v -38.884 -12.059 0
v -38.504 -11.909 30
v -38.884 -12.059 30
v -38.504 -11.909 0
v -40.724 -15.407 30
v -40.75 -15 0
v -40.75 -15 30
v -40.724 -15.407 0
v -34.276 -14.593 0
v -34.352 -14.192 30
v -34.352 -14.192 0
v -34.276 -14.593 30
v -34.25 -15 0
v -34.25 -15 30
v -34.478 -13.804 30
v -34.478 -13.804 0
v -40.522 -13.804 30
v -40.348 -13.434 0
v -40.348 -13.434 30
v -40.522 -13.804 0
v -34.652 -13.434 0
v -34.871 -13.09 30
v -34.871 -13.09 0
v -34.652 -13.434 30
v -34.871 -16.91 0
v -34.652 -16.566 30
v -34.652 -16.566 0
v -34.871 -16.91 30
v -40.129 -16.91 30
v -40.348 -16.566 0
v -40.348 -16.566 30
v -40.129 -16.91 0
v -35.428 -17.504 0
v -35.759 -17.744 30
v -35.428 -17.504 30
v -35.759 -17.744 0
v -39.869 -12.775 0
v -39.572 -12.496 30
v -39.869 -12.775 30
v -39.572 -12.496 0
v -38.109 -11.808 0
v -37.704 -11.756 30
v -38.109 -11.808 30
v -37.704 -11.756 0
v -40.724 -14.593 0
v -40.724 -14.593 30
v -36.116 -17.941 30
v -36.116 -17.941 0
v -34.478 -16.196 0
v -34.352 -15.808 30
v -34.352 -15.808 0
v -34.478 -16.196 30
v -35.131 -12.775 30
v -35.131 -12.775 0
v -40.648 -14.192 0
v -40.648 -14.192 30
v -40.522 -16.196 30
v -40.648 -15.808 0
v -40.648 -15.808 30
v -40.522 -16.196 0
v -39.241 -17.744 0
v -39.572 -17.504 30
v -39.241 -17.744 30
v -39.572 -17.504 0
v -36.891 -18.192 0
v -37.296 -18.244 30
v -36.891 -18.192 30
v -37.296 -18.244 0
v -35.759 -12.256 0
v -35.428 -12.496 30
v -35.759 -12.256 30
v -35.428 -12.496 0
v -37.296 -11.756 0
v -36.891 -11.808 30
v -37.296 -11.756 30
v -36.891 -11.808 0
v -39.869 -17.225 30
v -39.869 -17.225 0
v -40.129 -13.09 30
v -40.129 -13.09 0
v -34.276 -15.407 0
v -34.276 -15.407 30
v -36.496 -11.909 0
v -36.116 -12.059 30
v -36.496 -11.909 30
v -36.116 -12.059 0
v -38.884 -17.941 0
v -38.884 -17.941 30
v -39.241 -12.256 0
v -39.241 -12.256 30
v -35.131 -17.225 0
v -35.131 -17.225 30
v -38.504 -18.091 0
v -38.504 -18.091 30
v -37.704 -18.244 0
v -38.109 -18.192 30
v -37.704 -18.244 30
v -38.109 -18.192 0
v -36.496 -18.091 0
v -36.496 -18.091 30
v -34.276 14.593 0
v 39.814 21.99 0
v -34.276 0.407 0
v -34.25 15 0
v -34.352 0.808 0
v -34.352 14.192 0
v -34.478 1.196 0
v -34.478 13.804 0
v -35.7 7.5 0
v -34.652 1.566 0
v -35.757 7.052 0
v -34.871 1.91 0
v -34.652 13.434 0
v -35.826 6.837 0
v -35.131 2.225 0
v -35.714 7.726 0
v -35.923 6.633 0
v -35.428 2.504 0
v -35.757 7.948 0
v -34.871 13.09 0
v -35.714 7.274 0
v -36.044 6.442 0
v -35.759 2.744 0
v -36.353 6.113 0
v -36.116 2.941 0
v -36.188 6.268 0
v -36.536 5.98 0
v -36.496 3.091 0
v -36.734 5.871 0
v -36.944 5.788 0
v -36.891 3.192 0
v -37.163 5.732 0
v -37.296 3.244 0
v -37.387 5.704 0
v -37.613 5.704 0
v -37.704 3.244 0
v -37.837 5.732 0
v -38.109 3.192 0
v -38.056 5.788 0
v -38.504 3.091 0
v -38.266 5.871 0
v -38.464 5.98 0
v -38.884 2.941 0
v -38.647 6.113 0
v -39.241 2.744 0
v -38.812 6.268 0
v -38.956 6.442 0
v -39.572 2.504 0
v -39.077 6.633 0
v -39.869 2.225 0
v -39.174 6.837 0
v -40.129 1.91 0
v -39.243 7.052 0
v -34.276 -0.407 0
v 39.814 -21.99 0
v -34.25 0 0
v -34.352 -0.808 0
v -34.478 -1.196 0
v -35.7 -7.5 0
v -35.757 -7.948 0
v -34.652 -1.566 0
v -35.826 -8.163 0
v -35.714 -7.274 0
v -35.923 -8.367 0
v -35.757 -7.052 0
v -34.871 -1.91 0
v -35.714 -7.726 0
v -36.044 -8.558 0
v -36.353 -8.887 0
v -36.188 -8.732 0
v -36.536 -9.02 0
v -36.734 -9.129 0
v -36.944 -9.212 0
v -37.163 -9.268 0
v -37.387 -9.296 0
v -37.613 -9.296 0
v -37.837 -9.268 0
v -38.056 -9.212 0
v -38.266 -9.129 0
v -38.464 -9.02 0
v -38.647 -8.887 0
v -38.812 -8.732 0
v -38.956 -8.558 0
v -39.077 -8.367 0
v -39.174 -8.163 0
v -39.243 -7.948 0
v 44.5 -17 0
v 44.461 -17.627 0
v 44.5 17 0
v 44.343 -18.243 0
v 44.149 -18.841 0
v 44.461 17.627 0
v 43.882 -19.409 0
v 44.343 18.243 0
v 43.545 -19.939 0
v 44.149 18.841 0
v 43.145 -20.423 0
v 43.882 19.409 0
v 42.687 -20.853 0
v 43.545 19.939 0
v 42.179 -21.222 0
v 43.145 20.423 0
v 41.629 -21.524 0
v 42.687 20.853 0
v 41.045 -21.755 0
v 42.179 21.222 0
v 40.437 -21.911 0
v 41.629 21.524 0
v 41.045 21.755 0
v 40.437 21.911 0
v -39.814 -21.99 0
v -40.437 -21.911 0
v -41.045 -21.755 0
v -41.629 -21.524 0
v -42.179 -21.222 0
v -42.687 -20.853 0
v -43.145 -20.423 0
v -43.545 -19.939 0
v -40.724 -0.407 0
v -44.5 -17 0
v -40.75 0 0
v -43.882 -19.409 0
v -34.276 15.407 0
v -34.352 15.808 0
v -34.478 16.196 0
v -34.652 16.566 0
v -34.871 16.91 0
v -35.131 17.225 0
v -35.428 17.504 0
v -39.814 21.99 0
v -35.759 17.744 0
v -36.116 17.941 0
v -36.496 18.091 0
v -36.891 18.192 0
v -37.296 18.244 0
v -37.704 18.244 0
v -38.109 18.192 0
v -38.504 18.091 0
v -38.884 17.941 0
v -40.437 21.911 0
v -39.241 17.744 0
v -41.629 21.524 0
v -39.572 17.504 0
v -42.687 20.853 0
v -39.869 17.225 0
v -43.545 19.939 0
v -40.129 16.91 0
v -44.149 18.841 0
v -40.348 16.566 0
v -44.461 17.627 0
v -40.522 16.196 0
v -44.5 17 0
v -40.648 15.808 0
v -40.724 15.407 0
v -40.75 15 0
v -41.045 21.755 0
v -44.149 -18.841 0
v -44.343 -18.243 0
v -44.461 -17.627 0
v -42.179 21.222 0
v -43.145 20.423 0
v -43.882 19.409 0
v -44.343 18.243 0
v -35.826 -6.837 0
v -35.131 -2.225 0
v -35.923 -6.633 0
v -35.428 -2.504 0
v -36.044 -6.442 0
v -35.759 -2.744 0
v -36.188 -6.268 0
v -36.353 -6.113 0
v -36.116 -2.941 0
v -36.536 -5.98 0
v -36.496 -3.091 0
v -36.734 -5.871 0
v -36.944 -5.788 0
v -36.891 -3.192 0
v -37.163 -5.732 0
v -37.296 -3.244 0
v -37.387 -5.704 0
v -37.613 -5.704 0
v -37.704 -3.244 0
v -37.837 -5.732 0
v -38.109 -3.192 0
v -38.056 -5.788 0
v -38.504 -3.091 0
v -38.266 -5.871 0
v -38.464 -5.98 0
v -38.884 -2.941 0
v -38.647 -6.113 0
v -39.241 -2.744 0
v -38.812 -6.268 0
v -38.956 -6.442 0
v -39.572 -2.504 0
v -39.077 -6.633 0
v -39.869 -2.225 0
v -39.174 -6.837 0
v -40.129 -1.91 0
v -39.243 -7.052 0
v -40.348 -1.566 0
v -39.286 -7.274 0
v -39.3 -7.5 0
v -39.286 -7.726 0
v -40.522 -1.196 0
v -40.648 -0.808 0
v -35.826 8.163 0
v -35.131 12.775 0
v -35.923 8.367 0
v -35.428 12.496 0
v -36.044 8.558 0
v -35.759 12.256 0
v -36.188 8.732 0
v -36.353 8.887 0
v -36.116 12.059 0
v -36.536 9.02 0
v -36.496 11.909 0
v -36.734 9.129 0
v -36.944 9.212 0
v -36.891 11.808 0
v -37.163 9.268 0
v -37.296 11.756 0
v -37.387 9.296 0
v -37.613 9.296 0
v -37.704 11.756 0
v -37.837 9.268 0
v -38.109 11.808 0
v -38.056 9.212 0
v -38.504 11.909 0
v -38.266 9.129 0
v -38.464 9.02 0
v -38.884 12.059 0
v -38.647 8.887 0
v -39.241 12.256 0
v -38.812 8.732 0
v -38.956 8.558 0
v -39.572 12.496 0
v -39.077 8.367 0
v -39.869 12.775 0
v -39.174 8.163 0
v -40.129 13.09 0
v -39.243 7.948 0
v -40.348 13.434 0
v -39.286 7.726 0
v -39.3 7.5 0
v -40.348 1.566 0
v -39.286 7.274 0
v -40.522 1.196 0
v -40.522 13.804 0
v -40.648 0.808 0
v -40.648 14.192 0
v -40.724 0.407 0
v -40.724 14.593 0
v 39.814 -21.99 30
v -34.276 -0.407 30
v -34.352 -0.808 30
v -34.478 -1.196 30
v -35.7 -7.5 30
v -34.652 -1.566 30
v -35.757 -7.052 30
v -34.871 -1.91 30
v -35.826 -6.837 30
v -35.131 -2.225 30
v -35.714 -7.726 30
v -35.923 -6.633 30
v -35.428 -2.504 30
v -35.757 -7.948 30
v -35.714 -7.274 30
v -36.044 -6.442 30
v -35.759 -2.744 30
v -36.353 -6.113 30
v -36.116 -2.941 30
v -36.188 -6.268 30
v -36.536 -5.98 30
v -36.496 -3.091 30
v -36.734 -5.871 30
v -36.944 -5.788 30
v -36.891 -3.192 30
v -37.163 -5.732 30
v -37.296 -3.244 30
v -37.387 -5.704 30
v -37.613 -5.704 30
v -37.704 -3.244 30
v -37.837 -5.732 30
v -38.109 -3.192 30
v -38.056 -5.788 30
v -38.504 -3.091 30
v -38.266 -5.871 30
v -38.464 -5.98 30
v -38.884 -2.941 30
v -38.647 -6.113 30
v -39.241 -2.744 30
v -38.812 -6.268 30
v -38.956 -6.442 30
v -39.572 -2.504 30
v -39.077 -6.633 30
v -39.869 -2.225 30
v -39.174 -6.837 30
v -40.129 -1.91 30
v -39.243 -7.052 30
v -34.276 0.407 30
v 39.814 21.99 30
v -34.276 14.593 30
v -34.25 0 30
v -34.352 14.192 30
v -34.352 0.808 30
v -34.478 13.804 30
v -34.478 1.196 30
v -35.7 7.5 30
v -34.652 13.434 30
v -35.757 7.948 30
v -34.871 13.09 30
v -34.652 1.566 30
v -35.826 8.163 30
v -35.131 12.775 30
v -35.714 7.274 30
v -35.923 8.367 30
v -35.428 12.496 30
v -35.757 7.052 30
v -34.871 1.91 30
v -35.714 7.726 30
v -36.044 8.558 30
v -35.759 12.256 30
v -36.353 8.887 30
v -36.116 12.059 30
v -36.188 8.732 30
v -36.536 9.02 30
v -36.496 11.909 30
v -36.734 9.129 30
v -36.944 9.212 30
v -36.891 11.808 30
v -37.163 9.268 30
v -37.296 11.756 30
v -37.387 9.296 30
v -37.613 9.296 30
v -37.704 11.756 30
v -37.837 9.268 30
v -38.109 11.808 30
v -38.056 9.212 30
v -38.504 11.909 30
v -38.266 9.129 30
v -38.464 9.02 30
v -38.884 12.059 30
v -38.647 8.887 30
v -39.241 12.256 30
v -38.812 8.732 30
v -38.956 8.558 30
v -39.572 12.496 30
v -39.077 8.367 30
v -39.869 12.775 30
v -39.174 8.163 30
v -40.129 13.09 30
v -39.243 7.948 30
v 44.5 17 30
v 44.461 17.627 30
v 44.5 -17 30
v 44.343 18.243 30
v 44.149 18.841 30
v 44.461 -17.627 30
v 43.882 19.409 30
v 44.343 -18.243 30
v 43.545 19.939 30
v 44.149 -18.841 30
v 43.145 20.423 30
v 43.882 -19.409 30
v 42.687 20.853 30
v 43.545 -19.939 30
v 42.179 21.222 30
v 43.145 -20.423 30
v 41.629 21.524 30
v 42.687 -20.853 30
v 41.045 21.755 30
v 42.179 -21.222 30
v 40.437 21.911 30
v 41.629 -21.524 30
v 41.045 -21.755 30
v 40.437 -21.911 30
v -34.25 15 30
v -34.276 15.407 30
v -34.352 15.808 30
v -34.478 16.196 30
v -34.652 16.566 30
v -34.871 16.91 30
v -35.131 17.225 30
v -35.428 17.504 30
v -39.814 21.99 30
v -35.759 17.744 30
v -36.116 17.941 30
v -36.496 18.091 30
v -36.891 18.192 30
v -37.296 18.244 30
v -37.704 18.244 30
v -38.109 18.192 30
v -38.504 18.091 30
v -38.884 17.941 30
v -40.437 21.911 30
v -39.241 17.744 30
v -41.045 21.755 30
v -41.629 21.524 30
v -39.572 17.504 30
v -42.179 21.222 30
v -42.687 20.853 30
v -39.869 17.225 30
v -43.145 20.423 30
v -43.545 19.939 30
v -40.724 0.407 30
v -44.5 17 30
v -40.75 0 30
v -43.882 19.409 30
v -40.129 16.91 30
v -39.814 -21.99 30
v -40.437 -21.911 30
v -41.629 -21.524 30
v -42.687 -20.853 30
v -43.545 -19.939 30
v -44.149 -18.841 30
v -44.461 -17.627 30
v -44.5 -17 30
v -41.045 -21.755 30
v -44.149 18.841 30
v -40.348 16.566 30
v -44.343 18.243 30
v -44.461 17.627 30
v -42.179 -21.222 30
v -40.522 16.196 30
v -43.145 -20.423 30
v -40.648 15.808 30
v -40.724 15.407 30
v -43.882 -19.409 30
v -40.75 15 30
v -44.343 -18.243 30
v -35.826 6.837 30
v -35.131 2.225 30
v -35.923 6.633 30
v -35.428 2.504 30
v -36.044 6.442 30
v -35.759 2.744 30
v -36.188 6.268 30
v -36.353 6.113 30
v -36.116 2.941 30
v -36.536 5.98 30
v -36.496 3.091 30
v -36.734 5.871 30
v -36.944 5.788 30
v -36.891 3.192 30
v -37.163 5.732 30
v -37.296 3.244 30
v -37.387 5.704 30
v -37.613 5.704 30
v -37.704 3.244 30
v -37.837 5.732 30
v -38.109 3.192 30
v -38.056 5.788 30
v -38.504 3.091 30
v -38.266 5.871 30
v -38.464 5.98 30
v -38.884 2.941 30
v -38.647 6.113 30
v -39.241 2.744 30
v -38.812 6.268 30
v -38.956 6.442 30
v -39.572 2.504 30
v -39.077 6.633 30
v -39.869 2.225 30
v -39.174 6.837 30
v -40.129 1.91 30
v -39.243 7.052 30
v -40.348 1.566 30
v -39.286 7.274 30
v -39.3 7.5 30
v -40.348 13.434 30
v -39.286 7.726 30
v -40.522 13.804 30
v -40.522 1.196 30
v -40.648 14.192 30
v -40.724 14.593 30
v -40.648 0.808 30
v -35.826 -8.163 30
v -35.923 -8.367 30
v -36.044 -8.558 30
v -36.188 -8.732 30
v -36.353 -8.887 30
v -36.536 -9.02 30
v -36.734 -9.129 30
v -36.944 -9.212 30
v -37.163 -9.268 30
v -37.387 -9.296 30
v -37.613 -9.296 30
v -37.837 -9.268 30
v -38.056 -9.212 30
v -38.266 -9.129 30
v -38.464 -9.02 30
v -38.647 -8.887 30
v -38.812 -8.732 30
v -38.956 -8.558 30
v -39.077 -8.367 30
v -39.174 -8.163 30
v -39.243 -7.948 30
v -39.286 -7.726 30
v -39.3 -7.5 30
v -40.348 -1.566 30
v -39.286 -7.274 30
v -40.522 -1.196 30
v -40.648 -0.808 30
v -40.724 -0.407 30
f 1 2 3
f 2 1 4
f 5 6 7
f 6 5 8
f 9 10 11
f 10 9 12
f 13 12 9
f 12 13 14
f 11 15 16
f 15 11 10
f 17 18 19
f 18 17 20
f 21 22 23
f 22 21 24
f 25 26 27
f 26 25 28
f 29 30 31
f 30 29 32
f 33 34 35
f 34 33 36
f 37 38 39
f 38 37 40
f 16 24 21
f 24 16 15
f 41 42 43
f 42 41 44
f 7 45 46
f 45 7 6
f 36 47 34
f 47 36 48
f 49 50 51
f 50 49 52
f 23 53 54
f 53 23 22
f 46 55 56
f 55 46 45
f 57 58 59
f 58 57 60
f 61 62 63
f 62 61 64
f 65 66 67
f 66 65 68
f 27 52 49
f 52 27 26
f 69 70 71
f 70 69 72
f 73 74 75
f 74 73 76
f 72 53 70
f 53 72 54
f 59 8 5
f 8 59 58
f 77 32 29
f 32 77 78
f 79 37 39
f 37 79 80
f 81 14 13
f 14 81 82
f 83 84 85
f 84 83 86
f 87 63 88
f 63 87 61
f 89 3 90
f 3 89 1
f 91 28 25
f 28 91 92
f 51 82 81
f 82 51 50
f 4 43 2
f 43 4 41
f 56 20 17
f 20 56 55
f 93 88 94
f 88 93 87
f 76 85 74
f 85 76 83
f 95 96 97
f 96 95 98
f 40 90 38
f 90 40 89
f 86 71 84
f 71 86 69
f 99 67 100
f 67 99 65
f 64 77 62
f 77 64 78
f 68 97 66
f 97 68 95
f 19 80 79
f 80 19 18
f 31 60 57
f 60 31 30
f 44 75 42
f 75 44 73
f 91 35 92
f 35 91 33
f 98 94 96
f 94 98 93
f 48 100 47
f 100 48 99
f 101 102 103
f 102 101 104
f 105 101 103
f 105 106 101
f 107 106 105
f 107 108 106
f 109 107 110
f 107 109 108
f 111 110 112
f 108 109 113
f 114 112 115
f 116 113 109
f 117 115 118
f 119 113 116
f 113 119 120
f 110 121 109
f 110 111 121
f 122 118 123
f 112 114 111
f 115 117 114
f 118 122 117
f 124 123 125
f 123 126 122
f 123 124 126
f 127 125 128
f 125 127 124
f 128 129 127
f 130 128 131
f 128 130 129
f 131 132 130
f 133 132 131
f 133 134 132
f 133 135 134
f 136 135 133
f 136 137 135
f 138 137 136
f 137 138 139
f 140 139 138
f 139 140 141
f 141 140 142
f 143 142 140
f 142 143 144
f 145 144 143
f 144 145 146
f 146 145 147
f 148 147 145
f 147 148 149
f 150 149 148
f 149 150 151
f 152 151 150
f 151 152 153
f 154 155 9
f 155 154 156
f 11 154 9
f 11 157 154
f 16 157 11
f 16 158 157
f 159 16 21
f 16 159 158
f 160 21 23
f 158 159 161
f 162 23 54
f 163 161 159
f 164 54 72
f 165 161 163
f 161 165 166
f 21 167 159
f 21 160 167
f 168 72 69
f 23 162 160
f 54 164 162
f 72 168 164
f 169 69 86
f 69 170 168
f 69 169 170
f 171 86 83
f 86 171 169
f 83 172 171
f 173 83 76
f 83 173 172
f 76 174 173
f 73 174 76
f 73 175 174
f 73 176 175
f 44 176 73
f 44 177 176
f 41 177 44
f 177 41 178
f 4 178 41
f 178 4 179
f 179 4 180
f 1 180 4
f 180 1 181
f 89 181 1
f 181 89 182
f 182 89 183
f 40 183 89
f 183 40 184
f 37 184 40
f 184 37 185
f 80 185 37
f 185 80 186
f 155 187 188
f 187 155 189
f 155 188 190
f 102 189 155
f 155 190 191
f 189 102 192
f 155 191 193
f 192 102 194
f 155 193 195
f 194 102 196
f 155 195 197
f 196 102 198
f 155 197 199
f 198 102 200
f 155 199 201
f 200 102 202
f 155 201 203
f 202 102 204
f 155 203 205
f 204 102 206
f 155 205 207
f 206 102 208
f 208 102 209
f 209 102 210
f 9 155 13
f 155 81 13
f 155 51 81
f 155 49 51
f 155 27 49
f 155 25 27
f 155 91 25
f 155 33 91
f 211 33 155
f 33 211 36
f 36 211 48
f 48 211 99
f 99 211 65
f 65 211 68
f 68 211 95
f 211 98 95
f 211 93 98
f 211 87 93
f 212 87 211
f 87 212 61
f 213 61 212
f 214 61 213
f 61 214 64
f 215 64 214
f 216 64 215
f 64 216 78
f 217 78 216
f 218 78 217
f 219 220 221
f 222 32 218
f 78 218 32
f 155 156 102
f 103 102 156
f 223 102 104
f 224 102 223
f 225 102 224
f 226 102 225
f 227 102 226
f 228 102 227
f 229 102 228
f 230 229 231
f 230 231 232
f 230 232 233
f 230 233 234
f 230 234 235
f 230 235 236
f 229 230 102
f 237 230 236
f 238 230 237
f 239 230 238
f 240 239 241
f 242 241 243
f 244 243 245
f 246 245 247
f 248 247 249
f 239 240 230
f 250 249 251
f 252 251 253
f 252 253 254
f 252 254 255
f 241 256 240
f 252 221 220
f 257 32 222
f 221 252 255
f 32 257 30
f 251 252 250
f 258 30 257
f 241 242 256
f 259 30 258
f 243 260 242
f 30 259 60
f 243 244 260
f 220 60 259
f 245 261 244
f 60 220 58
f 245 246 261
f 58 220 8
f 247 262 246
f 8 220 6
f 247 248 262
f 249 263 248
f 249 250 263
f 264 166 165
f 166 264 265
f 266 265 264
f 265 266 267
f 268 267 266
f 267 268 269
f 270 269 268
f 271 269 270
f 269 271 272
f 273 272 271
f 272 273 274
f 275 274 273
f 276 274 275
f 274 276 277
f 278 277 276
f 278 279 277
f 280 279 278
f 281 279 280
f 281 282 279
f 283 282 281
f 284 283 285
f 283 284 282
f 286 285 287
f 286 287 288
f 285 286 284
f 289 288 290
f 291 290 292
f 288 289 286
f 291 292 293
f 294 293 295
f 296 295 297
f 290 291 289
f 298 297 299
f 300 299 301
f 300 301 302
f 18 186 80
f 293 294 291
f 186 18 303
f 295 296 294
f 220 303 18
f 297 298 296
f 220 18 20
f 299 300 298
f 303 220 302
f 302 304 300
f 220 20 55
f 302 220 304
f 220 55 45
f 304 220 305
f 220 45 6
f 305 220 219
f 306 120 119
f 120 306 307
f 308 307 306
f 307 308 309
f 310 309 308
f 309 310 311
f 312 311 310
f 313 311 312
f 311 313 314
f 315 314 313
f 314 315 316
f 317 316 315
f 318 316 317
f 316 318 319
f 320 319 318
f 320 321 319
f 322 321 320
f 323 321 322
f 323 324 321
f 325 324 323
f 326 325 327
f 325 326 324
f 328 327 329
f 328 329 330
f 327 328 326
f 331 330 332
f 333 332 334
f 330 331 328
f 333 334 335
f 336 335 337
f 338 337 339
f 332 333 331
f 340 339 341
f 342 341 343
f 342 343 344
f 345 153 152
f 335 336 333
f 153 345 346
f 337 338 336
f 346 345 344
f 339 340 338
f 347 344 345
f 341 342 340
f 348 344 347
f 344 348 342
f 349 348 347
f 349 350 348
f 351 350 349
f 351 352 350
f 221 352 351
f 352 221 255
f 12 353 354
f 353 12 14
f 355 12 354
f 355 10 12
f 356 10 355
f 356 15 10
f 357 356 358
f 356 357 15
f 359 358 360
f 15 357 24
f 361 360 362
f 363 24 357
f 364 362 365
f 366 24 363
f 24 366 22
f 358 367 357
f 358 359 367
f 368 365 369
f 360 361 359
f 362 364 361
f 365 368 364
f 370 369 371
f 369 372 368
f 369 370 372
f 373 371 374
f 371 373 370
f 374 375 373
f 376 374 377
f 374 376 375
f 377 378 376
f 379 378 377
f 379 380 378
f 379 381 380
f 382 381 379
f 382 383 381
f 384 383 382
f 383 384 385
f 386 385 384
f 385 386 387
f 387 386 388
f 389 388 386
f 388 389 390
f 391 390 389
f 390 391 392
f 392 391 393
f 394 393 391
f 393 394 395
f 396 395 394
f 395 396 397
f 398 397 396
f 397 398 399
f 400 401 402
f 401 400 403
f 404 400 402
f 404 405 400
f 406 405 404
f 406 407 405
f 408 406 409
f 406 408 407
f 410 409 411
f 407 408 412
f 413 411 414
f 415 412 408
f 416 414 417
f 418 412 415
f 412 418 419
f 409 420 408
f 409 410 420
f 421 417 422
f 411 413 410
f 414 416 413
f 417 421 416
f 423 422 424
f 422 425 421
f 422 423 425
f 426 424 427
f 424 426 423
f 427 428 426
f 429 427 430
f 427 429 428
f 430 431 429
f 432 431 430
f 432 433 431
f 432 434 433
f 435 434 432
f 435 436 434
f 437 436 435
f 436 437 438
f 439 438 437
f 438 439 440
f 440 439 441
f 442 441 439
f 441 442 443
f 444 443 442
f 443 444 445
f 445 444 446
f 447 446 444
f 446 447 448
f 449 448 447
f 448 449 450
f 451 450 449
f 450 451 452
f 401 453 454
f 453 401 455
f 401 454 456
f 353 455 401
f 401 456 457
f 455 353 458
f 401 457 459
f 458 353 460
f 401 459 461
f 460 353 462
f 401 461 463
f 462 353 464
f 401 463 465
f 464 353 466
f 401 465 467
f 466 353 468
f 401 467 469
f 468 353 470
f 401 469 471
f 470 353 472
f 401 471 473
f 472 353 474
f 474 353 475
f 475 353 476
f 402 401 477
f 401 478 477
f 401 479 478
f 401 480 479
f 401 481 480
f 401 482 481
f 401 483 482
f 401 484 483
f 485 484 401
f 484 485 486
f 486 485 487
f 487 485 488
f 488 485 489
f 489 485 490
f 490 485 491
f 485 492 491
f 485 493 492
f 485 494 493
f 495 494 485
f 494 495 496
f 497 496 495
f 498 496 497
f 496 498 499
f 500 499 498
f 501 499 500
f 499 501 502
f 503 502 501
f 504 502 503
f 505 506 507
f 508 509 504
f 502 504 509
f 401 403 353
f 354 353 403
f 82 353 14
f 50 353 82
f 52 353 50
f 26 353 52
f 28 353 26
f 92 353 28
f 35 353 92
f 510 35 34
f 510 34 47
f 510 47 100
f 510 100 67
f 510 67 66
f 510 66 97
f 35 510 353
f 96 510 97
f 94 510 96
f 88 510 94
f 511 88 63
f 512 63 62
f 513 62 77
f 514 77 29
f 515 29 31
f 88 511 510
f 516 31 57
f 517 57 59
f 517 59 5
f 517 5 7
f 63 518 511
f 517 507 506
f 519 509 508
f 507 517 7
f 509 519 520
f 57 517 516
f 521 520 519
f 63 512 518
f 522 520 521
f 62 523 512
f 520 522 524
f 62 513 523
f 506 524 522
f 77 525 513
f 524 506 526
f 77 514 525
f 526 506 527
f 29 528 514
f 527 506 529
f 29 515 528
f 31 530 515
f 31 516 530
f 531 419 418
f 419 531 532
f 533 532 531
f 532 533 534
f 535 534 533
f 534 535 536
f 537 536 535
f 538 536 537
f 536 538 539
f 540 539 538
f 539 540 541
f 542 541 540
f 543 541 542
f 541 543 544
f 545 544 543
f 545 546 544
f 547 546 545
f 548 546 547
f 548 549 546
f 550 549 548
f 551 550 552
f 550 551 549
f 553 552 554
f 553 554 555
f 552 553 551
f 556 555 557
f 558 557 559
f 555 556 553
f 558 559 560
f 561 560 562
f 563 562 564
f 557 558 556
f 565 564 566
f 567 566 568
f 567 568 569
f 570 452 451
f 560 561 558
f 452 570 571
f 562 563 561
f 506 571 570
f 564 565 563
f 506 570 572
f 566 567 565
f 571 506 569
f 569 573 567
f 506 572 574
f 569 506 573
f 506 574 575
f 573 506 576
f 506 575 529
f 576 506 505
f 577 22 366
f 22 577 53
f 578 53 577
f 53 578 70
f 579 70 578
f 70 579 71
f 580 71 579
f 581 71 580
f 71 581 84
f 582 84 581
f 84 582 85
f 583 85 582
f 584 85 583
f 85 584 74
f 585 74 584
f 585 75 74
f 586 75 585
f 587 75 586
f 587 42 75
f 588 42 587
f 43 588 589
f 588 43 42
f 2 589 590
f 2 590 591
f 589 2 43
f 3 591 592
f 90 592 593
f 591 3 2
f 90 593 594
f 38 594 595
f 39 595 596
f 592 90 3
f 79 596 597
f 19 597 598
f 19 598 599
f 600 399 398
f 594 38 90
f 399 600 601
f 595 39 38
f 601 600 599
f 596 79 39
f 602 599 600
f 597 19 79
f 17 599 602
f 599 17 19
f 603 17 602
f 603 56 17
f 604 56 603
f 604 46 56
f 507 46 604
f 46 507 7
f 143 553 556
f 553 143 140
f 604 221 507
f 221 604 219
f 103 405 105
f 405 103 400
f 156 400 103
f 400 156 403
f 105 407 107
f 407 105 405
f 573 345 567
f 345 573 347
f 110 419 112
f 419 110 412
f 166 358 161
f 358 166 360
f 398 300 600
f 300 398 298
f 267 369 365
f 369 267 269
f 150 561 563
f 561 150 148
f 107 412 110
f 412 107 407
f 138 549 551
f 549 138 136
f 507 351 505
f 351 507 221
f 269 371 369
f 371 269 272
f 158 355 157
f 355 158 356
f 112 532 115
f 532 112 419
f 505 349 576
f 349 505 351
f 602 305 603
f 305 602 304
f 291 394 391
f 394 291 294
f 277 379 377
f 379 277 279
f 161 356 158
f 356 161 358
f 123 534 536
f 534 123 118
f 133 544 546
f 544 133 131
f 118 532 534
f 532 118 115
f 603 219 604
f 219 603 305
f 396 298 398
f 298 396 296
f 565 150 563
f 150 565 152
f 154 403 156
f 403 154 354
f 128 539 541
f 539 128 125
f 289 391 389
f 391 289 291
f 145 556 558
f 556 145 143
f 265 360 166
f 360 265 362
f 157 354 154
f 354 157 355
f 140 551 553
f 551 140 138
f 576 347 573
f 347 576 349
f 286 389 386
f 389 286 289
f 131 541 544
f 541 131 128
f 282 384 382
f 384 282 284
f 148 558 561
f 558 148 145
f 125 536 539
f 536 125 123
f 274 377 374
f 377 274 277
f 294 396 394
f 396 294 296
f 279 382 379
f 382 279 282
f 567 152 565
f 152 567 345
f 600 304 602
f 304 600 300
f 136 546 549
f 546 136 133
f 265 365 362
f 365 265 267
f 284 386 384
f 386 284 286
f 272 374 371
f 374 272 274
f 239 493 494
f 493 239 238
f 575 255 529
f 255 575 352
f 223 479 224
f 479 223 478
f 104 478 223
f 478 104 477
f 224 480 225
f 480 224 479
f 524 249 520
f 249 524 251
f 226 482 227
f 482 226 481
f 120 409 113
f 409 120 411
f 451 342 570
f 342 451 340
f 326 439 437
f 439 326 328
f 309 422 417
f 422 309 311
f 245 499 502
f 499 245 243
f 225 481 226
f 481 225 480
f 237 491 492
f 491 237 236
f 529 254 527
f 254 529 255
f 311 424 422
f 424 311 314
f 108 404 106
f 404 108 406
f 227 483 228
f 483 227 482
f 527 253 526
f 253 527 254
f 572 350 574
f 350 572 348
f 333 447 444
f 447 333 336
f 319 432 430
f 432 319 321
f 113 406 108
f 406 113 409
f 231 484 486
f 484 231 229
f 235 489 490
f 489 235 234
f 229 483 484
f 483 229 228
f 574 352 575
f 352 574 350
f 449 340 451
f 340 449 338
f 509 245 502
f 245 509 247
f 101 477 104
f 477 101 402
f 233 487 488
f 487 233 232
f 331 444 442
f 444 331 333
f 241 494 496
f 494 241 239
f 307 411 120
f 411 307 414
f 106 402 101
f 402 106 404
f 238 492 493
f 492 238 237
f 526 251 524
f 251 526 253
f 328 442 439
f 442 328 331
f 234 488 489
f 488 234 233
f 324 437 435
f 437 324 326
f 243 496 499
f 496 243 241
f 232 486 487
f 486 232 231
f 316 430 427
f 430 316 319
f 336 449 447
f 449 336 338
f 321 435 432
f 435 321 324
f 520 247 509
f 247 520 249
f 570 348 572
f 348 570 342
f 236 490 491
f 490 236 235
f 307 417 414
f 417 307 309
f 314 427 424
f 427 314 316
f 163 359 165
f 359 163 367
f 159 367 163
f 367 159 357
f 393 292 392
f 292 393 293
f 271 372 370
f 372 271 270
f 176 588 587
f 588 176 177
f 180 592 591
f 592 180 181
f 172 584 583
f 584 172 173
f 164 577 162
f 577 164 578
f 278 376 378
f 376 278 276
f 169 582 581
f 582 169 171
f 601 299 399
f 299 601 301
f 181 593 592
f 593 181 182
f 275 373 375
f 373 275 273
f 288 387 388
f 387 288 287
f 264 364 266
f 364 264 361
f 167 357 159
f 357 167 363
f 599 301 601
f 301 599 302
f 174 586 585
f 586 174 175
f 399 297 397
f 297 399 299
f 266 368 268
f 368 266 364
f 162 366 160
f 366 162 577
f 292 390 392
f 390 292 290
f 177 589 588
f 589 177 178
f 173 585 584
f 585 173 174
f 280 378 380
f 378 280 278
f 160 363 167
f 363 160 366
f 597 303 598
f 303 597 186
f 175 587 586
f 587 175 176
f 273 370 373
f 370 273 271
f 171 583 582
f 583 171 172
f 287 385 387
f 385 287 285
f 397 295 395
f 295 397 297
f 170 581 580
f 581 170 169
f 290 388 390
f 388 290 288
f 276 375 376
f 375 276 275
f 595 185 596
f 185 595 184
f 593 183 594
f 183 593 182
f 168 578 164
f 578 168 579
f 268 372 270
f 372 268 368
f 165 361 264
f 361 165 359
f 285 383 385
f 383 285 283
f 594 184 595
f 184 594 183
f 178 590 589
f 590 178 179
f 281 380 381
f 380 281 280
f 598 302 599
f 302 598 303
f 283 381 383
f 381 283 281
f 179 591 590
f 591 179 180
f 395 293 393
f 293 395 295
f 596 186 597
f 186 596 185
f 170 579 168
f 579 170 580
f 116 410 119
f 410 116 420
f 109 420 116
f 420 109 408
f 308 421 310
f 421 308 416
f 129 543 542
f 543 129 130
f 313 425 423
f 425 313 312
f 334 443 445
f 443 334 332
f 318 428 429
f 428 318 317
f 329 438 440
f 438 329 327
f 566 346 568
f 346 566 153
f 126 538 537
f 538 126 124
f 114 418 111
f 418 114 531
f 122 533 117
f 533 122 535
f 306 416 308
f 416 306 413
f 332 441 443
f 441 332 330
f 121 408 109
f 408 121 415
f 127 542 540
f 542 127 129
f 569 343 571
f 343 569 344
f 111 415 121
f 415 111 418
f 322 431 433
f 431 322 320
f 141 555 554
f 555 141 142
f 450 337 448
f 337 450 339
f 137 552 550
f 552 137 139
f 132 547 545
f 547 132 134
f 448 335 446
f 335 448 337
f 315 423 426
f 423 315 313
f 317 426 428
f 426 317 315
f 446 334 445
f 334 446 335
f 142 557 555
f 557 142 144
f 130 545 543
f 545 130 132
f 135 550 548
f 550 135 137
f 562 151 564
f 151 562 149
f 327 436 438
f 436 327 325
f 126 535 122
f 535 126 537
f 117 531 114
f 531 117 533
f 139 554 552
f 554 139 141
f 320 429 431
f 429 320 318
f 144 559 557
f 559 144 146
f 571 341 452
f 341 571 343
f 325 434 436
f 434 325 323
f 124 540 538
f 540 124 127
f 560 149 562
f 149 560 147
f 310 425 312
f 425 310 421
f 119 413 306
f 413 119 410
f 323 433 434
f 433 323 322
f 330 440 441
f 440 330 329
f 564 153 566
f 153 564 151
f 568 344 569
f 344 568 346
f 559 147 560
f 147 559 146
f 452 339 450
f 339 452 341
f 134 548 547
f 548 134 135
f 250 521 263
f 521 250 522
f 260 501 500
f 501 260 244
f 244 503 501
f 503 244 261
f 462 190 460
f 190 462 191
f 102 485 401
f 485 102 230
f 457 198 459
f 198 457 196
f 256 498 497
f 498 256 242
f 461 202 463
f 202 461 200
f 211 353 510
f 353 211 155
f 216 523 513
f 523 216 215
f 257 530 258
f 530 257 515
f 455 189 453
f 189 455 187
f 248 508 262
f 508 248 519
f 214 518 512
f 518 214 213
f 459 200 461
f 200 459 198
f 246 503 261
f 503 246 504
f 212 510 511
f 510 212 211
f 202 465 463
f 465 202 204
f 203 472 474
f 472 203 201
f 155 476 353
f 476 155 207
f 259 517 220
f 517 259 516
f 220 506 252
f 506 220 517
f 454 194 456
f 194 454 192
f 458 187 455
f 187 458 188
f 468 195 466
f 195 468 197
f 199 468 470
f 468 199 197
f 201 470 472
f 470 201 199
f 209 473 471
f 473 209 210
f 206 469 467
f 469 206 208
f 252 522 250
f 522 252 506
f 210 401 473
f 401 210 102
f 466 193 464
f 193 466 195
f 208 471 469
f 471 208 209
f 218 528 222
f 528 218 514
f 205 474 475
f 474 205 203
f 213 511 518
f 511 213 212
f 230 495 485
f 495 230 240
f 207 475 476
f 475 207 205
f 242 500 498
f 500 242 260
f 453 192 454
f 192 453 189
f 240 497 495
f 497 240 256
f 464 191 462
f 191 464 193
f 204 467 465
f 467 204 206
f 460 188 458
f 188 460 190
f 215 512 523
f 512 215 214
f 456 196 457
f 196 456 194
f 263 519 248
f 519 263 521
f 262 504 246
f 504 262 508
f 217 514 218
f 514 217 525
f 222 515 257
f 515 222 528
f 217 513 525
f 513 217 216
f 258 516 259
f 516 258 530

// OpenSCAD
$fn = 50;


difference() {
	union() {
		hull() {
			translate(v = [-39.5000000000, 17.0000000000, 0]) {
				cylinder(h = 30, r = 5);
			}
			translate(v = [39.5000000000, 17.0000000000, 0]) {
				cylinder(h = 30, r = 5);
			}
			translate(v = [-39.5000000000, -17.0000000000, 0]) {
				cylinder(h = 30, r = 5);
			}
			translate(v = [39.5000000000, -17.0000000000, 0]) {
				cylinder(h = 30, r = 5);
			}
		}
	}
	union() {
		translate(v = [-37.5000000000, -15.0000000000, 0]) {
			cylinder(h = 30, r = 3.2500000000);
		}
		translate(v = [-37.5000000000, 0.0000000000, 0]) {
			cylinder(h = 30, r = 3.2500000000);
		}
		translate(v = [-37.5000000000, 15.0000000000, 0]) {
			cylinder(h = 30, r = 3.2500000000);
		}
		translate(v = [-37.5000000000, -15.0000000000, 0]) {
			cylinder(h = 30, r = 1.8000000000);
		}
		translate(v = [-37.5000000000, -7.5000000000, 0]) {
			cylinder(h = 30, r = 1.8000000000);
		}
		translate(v = [-37.5000000000, 0.0000000000, 0]) {
			cylinder(h = 30, r = 1.8000000000);
		}
		translate(v = [-37.5000000000, 7.5000000000, 0]) {
			cylinder(h = 30, r = 1.8000000000);
		}
		translate(v = [-37.5000000000, 15.0000000000, 0]) {
			cylinder(h = 30, r = 1.8000000000);
		}
		translate(v = [-37.5000000000, -15.0000000000, 0]) {
			cylinder(h = 30, r = 1.8000000000);
		}
		translate(v = [-37.5000000000, -7.5000000000, 0]) {
			cylinder(h = 30, r = 1.8000000000);
		}
		translate(v = [-37.5000000000, 0.0000000000, 0]) {
			cylinder(h = 30, r = 1.8000000000);
		}
		translate(v = [-37.5000000000, 7.5000000000, 0]) {
			cylinder(h = 30, r = 1.8000000000);
		}
		translate(v = [-37.5000000000, 15.0000000000, 0]) {
			cylinder(h = 30, r = 1.8000000000);
		}
		translate(v = [-37.5000000000, -15.0000000000, 0]) {
			cylinder(h = 30, r = 1.8000000000);
		}
		translate(v = [-37.5000000000, -7.5000000000, 0]) {
			cylinder(h = 30, r = 1.8000000000);
		}
		translate(v = [-37.5000000000, 0.0000000000, 0]) {
			cylinder(h = 30, r = 1.8000000000);
		}
		translate(v = [-37.5000000000, 7.5000000000, 0]) {
			cylinder(h = 30, r = 1.8000000000);
		}
		translate(v = [-37.5000000000, 15.0000000000, 0]) {
			cylinder(h = 30, r = 1.8000000000);
		}
	}
}
